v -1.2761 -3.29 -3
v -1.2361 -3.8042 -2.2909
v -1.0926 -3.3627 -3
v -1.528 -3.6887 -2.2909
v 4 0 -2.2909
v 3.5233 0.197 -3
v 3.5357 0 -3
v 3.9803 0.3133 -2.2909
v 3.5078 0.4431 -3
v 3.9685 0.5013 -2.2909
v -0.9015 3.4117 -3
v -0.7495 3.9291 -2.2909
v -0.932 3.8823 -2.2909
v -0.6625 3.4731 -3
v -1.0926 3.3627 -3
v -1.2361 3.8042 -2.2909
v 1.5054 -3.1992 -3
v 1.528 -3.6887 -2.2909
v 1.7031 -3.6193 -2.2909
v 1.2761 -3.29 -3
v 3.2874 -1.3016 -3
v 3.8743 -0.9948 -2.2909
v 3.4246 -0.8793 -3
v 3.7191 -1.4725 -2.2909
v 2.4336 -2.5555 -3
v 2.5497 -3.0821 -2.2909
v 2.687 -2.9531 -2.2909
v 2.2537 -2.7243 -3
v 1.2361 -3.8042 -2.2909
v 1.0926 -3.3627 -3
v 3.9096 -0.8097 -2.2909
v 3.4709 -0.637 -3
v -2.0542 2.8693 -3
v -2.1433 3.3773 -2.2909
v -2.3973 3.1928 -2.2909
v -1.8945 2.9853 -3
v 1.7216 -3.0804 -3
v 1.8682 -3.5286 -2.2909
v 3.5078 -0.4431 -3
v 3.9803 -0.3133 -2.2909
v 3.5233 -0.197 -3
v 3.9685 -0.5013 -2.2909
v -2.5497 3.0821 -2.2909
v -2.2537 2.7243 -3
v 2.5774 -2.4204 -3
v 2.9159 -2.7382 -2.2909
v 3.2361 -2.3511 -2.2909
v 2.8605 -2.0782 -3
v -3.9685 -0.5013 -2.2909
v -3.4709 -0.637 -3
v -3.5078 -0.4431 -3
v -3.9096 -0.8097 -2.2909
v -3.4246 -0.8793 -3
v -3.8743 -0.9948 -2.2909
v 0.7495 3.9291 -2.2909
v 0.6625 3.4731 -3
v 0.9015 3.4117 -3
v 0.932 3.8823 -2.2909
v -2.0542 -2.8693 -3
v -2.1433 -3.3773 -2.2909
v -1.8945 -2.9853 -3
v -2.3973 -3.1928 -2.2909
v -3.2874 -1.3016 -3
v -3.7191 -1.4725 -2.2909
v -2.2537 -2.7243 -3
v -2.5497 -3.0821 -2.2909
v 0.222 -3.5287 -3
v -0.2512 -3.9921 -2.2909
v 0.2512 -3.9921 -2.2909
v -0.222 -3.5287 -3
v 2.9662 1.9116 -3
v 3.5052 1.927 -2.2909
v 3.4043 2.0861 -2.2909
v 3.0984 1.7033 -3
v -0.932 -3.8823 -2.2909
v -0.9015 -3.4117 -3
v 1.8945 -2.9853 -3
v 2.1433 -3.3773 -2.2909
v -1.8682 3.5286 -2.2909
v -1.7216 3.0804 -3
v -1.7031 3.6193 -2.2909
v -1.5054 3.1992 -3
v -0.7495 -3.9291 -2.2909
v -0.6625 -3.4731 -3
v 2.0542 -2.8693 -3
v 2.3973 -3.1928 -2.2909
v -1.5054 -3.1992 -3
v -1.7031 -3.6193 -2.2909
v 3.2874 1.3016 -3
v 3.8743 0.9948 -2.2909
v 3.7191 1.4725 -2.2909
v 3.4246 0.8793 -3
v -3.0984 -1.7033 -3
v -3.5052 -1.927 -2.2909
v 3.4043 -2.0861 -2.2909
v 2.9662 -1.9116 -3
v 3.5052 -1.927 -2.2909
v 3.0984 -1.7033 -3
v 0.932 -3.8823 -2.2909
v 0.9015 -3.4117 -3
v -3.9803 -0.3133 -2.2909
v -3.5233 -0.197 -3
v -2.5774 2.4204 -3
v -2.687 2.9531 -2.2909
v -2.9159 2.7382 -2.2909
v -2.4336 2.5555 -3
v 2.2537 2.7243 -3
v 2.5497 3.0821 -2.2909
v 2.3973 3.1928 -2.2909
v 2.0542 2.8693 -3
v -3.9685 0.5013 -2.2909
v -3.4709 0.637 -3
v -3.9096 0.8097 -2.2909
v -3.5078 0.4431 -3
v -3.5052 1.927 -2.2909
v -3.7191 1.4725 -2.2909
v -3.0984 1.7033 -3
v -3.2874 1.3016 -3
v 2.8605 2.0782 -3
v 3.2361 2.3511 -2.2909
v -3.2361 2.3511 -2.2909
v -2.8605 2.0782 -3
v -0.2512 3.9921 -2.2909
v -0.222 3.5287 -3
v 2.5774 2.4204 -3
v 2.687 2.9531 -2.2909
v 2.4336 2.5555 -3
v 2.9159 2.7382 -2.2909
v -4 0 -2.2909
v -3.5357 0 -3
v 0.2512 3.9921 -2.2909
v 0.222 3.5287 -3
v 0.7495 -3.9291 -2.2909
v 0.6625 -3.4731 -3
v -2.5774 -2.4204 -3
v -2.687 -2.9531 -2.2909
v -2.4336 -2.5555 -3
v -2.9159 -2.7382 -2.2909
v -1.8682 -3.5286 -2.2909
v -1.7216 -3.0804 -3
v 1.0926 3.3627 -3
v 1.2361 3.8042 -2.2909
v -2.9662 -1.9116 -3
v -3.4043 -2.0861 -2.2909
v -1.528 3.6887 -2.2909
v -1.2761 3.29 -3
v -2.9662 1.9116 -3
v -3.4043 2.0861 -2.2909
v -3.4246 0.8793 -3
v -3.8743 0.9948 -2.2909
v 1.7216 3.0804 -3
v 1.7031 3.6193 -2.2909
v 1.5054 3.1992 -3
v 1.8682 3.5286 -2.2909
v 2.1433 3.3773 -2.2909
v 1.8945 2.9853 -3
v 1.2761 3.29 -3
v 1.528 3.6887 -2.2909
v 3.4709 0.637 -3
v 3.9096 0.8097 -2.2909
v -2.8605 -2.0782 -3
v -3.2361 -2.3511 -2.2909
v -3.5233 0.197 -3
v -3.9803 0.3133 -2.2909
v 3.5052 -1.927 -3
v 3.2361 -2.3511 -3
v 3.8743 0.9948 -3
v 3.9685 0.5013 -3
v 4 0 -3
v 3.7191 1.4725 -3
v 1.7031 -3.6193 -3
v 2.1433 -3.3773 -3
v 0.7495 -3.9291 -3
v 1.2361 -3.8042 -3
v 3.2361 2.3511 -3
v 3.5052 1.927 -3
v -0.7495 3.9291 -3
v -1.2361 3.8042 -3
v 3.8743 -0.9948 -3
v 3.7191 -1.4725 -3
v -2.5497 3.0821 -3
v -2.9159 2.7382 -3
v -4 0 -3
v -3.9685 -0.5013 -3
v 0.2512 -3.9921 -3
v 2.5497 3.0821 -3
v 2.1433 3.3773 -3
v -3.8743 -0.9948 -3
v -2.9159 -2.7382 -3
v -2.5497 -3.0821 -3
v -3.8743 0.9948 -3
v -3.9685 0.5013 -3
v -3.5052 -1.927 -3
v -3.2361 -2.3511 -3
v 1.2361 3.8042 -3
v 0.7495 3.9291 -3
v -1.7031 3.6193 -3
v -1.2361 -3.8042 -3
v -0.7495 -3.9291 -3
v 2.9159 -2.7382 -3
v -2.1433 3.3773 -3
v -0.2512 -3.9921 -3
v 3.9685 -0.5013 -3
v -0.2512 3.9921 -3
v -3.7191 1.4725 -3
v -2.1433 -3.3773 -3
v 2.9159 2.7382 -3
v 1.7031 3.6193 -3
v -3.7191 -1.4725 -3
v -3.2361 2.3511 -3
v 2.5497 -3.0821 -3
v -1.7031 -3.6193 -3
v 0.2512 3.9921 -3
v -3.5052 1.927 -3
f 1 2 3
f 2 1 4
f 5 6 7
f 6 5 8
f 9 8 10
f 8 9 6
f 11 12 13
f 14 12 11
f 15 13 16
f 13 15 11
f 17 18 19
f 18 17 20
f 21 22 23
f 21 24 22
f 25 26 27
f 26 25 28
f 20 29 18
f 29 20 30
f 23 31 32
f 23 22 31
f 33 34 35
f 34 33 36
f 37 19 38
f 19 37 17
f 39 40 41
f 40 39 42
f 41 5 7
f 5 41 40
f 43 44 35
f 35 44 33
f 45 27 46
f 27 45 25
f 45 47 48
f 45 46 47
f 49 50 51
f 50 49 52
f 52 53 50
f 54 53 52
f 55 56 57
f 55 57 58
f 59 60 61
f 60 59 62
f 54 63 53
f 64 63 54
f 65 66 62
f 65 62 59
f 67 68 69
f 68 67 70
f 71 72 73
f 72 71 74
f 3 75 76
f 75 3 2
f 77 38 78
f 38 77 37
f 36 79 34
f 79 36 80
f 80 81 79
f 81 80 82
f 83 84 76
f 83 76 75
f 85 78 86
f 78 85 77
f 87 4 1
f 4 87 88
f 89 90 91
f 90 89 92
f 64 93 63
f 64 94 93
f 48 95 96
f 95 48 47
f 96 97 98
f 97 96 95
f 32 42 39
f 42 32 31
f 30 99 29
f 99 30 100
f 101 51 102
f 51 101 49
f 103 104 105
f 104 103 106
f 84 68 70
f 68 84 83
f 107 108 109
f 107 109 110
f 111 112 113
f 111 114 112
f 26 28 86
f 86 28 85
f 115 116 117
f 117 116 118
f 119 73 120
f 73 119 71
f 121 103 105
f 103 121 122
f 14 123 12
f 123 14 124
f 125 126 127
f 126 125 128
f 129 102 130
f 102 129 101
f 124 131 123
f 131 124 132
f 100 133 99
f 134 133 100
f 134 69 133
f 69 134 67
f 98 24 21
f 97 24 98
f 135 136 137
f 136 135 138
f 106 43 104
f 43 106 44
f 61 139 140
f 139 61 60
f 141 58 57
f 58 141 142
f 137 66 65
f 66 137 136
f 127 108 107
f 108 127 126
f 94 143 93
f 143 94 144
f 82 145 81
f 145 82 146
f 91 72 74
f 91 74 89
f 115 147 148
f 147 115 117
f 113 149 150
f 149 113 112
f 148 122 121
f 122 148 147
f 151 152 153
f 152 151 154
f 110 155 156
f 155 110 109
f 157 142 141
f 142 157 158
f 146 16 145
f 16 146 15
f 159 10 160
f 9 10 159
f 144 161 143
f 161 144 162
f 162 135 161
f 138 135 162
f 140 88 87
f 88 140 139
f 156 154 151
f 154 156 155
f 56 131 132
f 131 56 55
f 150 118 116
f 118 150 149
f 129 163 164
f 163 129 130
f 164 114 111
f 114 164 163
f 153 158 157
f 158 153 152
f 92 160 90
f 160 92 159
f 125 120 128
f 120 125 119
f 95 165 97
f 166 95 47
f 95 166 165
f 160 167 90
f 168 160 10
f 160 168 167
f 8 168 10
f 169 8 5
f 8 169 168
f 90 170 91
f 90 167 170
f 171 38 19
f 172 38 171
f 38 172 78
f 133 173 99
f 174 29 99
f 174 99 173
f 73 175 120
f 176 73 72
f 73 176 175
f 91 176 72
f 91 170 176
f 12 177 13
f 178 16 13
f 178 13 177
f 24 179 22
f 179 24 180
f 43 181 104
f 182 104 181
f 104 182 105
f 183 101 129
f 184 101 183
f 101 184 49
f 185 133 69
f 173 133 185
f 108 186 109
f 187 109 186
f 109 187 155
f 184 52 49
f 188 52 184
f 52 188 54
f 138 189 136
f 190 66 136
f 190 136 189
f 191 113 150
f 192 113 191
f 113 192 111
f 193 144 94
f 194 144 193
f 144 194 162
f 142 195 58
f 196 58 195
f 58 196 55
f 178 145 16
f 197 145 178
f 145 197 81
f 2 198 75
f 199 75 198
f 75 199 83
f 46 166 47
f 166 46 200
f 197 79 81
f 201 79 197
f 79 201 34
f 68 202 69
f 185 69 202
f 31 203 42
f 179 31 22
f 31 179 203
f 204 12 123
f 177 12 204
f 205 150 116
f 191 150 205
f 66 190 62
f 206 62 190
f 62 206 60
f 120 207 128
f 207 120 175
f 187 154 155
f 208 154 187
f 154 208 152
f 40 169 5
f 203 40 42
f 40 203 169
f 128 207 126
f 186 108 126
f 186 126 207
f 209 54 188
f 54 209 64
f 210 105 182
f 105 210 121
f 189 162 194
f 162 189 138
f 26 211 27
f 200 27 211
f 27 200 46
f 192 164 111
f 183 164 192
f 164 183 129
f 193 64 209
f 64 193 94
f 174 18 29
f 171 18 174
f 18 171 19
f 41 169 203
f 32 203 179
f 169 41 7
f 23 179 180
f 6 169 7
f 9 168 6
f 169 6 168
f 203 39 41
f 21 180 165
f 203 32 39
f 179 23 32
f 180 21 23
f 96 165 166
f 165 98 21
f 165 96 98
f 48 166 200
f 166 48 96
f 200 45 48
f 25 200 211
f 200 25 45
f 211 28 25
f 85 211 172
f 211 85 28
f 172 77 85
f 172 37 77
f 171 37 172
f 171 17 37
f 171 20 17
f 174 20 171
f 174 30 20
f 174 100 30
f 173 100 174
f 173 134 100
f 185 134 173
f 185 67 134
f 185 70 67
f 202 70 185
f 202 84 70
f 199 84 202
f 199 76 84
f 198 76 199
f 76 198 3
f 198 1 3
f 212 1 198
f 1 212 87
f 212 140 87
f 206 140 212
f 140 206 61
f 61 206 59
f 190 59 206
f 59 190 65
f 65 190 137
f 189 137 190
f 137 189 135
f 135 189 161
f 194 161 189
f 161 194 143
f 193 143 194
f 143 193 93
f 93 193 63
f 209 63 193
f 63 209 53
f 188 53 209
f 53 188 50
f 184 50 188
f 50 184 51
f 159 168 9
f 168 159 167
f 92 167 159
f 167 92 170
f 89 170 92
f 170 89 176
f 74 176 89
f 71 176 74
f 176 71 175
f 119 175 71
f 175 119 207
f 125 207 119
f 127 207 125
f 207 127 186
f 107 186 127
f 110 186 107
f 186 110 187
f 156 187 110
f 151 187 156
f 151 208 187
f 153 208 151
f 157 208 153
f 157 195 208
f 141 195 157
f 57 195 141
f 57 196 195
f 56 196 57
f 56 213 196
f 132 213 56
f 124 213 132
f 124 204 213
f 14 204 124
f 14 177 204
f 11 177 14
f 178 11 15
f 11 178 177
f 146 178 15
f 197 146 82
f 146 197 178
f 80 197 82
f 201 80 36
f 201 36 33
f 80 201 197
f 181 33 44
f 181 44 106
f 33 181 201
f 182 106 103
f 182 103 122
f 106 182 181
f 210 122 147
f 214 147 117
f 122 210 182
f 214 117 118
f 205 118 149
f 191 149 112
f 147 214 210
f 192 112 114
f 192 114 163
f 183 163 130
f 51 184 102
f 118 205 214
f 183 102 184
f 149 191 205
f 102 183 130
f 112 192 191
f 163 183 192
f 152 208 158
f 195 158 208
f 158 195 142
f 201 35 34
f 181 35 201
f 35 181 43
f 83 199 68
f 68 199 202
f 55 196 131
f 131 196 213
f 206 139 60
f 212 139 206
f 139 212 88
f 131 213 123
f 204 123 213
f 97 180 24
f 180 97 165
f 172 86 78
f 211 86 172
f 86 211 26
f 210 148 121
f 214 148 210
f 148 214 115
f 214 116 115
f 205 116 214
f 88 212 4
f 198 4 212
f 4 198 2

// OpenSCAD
$fn = 50;

difference() {
	union() {
		translate(v = [0, 0, -3.0]) {
			cylinder(h = 6, r = 4.0);
		}
	}
	union() {
		translate(v = [0, 0, 0]) {
			rotate(a = [0, 0, 0]) {
				difference() {
					union() {
						translate(v = [0, 0, -6.0]) {
							cylinder(h = 6, r = 2.25);
						}
						translate(v = [0, 0, -4.2]) {
							cylinder(h = 4.2, r1 = 2.75, r2 = 5.5);
						}
						translate(v = [0, 0, -6.0]) {
							cylinder(h = 6, r = 2.75);
						}
						translate(v = [0, 0, -6.0]) {
							cylinder(h = 6, r = 2.25);
						}
					}
					union();
				}
			}
		}
		#cylinder(h = 3, r = 6.25);
	}
}
